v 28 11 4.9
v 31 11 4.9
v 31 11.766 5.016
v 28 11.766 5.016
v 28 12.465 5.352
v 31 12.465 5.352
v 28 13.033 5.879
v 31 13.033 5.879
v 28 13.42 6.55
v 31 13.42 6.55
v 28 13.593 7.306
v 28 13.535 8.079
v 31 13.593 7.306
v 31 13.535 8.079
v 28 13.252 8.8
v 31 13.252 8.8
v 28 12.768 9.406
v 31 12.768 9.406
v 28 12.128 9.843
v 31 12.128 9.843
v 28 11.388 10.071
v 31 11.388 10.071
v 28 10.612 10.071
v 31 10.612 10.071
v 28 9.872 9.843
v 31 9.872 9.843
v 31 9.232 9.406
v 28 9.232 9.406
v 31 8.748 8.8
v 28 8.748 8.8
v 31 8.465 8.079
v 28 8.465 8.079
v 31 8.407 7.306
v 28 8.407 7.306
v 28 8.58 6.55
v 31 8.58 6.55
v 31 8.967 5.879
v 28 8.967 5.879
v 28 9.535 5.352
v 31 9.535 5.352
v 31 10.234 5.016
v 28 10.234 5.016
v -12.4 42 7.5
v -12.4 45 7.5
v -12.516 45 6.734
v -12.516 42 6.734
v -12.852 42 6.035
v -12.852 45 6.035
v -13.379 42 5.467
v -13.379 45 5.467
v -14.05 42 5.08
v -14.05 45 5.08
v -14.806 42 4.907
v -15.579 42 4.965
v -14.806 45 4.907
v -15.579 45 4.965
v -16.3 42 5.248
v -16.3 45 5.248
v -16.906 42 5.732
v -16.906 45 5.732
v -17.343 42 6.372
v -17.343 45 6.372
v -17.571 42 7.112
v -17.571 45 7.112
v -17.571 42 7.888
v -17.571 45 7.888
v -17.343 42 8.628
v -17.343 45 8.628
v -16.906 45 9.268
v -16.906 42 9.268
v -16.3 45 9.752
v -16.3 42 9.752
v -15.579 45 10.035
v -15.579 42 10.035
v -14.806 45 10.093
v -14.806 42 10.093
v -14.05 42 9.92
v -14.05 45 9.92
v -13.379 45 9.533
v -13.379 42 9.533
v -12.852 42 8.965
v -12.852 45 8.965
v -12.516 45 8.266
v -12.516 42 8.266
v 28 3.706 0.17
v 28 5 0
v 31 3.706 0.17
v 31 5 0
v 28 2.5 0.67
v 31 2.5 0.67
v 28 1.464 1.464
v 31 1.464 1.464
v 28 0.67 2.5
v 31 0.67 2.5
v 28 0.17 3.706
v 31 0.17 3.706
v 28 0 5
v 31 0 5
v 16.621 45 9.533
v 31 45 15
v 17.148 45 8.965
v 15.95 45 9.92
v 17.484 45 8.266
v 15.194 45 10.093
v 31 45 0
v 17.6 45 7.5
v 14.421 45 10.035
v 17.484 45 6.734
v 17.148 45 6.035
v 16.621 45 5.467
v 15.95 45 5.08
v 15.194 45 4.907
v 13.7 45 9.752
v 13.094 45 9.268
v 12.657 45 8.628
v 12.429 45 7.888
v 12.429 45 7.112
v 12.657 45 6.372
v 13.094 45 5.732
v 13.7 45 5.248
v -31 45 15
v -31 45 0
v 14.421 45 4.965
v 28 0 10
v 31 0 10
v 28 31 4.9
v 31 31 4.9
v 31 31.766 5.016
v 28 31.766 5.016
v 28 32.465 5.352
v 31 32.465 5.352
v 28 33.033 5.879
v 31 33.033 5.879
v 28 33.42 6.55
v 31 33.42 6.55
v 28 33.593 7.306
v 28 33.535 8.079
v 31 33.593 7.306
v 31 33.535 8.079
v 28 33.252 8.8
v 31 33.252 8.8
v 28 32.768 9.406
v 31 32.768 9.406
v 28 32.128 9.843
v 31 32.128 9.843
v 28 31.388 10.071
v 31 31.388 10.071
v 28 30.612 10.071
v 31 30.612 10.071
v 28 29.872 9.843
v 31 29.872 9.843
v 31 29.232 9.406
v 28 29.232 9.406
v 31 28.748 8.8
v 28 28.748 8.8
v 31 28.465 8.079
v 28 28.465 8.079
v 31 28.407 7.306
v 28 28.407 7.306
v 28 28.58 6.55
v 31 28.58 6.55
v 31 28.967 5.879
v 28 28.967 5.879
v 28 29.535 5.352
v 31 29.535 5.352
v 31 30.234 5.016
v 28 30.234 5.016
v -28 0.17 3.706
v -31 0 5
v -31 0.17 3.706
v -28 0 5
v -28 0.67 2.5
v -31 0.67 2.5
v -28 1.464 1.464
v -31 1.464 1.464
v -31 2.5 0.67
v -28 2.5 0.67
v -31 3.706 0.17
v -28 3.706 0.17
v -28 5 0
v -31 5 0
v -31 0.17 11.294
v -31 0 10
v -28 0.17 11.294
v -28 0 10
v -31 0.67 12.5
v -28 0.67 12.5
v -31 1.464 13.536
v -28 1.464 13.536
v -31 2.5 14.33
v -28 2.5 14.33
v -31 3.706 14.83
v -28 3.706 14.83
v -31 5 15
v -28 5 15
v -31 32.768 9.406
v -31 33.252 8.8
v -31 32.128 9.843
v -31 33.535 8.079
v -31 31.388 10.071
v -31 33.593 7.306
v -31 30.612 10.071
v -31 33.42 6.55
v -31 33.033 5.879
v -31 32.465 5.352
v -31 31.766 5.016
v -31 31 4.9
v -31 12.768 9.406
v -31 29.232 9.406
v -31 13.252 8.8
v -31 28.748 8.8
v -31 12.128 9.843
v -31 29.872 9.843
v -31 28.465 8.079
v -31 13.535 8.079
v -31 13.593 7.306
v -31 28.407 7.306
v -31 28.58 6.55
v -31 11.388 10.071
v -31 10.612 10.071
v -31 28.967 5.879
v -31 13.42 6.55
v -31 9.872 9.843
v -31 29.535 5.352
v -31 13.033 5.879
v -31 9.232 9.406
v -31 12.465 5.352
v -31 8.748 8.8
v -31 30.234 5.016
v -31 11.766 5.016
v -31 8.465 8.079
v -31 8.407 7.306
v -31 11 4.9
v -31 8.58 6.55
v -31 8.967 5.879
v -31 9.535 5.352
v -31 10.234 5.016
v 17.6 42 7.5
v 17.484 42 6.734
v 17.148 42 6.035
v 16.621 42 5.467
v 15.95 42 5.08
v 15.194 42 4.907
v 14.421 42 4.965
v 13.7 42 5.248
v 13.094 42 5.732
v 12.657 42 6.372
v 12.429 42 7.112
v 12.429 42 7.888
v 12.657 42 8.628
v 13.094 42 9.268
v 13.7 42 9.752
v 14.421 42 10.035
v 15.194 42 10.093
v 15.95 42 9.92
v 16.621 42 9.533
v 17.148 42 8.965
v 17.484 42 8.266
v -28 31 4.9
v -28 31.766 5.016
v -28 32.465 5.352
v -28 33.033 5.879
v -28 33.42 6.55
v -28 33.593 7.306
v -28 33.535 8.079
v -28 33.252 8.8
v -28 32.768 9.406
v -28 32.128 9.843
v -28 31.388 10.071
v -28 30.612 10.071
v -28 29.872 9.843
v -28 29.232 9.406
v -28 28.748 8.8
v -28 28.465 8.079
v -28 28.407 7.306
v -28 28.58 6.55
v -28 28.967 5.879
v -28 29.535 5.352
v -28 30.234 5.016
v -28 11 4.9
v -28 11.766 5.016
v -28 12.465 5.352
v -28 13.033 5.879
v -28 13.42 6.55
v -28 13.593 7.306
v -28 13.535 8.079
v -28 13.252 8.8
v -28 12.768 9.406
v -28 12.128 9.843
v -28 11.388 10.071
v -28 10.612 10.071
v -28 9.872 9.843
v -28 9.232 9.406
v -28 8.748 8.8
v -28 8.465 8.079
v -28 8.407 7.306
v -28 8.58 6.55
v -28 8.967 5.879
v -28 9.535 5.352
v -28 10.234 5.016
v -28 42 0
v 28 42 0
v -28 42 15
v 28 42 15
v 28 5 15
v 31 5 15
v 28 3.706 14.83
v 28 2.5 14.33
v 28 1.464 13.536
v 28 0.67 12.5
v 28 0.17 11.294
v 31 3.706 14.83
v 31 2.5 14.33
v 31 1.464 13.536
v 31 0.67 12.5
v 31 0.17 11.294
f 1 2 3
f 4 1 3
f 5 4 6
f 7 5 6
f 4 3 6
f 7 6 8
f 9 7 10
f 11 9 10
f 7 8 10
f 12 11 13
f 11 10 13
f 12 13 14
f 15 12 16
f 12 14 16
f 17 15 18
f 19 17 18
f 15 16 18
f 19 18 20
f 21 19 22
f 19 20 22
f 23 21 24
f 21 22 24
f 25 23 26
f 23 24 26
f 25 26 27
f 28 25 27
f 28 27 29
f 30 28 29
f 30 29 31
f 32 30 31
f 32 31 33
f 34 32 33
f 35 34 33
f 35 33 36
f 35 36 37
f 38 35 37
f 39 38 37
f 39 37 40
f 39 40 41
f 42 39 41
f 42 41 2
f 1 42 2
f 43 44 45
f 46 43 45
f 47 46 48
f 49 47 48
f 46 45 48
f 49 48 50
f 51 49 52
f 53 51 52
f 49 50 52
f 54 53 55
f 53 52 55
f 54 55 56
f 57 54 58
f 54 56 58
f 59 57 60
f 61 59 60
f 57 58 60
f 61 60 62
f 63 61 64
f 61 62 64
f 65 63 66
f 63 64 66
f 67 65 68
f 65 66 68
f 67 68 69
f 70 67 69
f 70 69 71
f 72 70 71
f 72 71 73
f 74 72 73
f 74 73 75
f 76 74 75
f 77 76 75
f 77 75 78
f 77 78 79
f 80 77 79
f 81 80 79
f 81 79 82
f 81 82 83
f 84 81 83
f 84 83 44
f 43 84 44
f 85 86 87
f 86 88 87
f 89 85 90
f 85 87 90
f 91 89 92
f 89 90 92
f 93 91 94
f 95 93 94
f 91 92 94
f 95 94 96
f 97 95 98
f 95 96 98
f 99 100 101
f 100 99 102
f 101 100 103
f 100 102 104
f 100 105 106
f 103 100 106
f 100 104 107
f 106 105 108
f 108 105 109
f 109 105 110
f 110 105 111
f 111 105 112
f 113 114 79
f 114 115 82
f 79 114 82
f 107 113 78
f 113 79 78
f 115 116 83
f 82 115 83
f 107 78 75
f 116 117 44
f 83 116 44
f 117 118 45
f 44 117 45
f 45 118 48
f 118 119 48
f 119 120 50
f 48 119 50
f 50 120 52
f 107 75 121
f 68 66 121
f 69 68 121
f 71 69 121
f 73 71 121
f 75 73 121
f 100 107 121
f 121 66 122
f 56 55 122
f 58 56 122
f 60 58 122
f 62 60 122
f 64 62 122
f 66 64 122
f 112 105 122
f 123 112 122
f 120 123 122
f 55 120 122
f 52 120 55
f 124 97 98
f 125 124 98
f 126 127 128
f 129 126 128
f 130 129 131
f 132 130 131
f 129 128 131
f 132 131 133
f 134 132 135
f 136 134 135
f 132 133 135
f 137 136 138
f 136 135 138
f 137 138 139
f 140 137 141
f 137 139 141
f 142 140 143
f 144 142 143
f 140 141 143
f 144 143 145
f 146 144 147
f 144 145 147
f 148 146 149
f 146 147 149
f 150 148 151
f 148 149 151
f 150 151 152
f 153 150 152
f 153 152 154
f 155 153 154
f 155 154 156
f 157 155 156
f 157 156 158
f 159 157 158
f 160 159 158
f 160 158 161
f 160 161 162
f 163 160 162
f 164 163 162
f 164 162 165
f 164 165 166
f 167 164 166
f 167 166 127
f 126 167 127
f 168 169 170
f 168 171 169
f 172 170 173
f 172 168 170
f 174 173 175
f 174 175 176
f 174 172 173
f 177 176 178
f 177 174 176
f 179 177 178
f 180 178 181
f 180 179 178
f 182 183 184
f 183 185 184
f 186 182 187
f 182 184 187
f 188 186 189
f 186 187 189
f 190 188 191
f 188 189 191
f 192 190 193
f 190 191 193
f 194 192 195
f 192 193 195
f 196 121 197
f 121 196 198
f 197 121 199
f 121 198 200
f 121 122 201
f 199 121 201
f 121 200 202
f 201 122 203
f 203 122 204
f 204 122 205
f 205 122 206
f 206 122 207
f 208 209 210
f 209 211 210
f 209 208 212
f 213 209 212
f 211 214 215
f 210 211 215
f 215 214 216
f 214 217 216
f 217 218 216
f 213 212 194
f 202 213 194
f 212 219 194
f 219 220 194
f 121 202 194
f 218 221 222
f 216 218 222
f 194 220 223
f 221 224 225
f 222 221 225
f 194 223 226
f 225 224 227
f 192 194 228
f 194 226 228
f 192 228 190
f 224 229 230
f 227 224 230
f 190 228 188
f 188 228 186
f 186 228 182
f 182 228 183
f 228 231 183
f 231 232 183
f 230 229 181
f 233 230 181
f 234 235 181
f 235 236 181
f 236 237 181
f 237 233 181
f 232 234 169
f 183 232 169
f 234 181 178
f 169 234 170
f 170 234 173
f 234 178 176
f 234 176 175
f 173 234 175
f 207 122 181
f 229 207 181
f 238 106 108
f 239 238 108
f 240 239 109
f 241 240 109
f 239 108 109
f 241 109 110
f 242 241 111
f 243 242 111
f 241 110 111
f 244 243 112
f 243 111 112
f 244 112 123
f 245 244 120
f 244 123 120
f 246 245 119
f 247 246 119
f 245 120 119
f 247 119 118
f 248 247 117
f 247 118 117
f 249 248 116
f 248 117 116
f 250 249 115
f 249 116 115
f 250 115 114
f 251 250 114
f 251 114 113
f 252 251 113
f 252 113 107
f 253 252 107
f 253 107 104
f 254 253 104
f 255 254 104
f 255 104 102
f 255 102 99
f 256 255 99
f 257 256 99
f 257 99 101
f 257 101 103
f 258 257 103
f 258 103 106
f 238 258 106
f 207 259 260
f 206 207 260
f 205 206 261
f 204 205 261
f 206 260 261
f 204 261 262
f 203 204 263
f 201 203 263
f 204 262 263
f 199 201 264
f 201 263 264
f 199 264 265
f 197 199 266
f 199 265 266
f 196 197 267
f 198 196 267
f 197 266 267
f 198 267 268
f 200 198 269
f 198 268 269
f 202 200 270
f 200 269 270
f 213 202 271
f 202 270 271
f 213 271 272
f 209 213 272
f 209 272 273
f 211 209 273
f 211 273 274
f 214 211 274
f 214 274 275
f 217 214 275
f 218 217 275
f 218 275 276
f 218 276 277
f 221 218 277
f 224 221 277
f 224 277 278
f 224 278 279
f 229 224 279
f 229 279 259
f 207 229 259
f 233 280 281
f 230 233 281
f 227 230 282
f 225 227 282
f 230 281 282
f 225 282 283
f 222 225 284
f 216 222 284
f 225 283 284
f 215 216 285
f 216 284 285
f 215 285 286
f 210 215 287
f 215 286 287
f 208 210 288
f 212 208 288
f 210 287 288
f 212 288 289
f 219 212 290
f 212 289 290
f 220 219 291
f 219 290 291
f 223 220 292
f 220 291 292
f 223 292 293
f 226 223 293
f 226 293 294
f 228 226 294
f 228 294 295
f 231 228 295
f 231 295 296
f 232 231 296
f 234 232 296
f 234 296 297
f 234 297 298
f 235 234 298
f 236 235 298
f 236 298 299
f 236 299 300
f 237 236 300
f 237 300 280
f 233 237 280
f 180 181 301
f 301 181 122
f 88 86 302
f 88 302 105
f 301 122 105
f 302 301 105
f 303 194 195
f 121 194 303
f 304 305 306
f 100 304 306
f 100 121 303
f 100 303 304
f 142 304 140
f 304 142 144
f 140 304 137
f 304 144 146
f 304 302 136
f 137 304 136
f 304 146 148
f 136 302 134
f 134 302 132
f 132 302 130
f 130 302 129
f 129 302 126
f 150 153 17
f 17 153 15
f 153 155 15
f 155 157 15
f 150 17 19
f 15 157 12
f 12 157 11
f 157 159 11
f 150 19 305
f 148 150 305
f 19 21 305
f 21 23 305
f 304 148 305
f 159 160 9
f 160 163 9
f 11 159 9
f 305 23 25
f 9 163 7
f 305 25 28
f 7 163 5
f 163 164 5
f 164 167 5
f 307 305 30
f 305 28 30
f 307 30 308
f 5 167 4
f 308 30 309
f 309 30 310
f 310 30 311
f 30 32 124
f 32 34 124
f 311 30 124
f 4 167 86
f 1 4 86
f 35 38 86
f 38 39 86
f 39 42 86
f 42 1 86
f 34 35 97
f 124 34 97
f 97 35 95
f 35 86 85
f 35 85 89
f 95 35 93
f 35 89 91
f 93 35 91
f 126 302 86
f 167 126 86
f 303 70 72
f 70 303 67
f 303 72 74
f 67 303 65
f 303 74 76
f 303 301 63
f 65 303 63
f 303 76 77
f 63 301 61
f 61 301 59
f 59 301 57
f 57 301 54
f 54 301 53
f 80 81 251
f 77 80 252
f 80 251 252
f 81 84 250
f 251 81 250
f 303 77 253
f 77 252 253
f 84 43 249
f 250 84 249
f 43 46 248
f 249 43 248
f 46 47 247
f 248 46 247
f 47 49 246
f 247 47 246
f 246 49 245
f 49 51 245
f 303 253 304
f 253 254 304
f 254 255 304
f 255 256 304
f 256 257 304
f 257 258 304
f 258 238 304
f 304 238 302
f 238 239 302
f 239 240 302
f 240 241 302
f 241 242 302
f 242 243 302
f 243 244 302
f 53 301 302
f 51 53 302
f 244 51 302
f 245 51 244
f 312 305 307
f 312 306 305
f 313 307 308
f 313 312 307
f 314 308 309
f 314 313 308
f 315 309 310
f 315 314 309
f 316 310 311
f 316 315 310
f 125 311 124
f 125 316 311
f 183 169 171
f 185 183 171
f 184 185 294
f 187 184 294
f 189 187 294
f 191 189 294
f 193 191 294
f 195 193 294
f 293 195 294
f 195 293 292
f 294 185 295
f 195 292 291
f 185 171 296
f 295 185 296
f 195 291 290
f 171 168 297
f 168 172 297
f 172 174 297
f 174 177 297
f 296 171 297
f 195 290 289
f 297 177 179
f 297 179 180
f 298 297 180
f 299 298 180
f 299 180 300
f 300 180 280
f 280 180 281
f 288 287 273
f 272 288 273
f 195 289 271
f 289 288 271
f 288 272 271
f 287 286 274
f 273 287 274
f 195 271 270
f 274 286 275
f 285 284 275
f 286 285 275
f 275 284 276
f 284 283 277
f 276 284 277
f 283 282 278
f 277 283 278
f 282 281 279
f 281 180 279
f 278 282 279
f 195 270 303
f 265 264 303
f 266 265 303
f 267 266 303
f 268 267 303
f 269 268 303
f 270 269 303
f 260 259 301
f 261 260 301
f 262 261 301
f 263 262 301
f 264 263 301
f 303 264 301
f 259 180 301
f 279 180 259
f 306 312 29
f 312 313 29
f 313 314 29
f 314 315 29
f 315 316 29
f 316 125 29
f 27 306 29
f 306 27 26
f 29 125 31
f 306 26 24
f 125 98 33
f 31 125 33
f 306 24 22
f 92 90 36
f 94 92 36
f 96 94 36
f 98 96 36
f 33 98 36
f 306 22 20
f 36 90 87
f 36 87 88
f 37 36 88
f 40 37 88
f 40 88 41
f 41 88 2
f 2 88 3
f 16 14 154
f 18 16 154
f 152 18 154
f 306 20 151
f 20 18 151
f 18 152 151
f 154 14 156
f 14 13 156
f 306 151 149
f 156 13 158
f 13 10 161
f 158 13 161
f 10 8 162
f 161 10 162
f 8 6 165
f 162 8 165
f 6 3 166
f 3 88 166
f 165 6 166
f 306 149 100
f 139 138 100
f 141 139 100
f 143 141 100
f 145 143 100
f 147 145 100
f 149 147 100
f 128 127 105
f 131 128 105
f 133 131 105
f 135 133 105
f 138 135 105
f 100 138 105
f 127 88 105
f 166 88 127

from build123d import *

# Parameters (mm, degrees)
RESSALTO_EXTRUS_O1_DEPTH = 15
ESBO_O2_R                = 2.6
CORTE_EXTRUS_O1_DEPTH    = 15
ESBO_O3_R                = 2.6
CORTE_EXTRUS_O2_DEPTH    = 63
FILETE1_R                = 5


with BuildPart() as part:
    # Esboço1 → Ressalto-extrusão1 (new body)
    with BuildSketch(Plane.XY):
        Polygon((-31, 0), (-28, 0), (-28, 42), (28, 42), (28, 0), (31, 0), (31, 45), (-31, 45), align=None)
    extrude(amount=RESSALTO_EXTRUS_O1_DEPTH)

    # Esboço2 → Corte-extrusão1 (cut)
    with BuildSketch(Plane(origin=(0, 45, 0), x_dir=(1, 0, 0), z_dir=(0, 1, 0))):
        with Locations((-15, -7.5)):
            Circle(ESBO_O2_R)
        with Locations((15, -7.5)):
            Circle(ESBO_O2_R)
    extrude(amount=-CORTE_EXTRUS_O1_DEPTH, mode=Mode.SUBTRACT)

    # Esboço3 → Corte-extrusão2 (cut, through all)
    with BuildSketch(Plane(origin=(31, 0, 0), x_dir=(0, 0, -1), z_dir=(1, 0, 0))):
        with Locations((-7.5, 11)):
            Circle(ESBO_O3_R)
        with Locations((-7.5, 31)):
            Circle(ESBO_O3_R)
    extrude(amount=-CORTE_EXTRUS_O2_DEPTH, mode=Mode.SUBTRACT)

    # Filete1
    filete1_edges = [part.edges().sort_by_distance(p)[0] for p in [
        (-29.5, 0, 0),
        (29.5, 0, 15),
        (-29.5, 0, 15),
        (29.5, 0, 0),
    ]]
    fillet(filete1_edges, radius=FILETE1_R)


solid = part.part
